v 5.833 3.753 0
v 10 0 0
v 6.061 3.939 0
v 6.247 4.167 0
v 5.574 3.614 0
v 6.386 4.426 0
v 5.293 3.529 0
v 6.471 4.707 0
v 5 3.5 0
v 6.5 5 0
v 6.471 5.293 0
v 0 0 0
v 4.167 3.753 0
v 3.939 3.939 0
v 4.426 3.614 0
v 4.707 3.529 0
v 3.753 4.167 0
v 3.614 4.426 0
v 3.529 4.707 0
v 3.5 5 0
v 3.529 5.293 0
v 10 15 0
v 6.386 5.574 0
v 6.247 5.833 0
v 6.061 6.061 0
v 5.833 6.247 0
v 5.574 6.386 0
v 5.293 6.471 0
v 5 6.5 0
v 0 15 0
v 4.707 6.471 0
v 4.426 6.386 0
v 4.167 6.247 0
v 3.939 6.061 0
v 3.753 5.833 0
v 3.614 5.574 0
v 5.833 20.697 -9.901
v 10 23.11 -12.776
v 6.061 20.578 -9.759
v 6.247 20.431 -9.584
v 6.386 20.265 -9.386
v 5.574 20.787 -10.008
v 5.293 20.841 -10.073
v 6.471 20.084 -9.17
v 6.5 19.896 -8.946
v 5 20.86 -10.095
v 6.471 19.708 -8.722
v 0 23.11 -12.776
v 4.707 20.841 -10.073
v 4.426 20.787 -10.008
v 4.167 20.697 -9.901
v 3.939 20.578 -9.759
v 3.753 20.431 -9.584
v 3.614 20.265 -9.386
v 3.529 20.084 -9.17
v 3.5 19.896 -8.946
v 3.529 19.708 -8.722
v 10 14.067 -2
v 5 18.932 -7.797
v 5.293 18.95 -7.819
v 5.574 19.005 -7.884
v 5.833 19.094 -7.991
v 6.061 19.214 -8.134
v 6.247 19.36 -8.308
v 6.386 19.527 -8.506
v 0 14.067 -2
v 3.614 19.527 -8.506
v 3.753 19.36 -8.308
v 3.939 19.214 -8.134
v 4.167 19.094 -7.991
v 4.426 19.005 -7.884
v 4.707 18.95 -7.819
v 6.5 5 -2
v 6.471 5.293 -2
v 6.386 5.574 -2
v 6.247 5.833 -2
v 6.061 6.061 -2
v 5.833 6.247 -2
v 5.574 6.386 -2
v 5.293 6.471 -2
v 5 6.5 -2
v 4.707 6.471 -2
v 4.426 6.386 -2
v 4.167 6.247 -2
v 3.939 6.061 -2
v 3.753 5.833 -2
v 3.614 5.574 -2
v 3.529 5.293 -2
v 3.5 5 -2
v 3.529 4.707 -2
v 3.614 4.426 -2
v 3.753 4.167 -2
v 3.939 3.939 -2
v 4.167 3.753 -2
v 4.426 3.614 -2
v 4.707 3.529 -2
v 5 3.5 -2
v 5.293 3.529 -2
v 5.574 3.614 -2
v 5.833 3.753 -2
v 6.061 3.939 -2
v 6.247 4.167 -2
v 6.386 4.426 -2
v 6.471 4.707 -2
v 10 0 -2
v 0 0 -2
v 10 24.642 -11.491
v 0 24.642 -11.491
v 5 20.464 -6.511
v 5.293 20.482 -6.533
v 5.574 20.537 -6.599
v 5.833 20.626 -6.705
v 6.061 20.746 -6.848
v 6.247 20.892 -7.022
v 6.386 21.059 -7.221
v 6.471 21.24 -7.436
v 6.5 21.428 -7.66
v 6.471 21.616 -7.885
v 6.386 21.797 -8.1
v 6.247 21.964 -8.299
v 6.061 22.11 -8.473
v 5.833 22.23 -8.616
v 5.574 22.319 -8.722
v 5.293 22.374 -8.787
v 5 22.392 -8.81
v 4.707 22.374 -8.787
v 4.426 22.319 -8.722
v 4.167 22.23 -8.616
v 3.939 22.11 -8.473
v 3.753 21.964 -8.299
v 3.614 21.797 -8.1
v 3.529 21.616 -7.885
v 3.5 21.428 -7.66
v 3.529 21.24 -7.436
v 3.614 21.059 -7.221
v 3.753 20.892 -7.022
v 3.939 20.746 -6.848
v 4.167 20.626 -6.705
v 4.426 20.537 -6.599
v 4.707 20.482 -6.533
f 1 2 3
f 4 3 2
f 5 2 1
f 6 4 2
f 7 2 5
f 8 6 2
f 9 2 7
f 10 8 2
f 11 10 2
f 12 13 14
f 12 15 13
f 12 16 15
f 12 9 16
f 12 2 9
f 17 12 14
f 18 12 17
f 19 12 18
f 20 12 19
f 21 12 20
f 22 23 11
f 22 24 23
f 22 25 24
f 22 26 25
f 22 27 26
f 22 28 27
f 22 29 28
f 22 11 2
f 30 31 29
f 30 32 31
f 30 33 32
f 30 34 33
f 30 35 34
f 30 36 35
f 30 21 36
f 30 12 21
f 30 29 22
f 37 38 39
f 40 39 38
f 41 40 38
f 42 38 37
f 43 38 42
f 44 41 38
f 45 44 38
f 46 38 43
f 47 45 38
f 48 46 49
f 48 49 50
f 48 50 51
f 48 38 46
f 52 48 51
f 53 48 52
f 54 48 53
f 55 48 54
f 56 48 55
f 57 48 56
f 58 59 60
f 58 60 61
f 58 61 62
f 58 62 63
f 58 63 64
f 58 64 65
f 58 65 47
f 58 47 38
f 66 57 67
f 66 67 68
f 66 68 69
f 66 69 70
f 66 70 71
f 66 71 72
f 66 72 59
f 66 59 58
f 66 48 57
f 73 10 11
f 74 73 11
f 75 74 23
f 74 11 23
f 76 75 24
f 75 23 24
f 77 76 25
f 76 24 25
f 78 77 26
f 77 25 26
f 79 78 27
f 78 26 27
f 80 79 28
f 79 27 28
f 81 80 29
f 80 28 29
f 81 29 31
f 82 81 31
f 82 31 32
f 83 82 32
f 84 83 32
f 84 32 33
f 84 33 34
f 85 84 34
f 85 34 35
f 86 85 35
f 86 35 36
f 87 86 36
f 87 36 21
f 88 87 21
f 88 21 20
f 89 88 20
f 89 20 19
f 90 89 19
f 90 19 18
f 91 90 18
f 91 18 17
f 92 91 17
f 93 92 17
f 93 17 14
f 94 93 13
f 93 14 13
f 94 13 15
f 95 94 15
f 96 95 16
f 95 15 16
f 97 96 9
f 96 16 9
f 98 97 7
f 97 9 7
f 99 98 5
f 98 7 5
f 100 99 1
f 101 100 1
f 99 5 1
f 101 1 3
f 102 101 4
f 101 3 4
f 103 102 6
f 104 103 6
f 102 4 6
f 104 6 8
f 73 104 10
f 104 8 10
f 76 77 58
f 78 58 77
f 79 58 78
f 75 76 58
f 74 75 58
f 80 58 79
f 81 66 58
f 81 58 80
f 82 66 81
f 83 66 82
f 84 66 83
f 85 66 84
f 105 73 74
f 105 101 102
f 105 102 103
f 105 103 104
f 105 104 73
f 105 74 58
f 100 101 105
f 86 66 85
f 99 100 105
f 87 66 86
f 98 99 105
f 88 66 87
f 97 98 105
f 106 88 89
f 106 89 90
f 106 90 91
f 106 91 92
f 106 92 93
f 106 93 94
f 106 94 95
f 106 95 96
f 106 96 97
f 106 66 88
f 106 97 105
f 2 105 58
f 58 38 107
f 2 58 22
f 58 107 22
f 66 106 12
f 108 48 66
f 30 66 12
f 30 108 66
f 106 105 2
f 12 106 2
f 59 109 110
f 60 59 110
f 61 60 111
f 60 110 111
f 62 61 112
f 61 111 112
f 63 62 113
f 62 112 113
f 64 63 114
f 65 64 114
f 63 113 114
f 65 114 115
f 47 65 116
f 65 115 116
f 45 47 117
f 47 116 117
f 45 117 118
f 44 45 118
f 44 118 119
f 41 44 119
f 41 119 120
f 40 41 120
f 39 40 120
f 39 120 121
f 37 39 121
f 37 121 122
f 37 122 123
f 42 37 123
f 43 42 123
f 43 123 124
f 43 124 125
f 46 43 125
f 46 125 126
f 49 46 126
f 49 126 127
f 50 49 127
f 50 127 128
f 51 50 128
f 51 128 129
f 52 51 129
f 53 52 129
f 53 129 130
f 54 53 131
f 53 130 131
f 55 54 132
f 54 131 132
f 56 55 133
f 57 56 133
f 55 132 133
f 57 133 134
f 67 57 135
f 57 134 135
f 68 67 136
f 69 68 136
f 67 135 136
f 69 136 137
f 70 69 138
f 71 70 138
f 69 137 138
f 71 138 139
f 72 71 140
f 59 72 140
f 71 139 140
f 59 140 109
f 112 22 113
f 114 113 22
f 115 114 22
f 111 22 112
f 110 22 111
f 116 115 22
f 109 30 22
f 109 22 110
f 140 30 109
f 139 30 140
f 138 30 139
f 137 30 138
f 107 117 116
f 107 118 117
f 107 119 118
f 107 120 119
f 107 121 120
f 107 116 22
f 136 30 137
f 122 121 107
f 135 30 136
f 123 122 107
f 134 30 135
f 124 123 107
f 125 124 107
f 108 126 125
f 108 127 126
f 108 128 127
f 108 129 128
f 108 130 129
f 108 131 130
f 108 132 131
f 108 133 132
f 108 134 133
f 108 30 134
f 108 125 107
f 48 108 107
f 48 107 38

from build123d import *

# Parameters (mm, degrees)
BOSS_EXTRUDE1_DEPTH = 10
SKETCH2_R           = 1.5
CUT_EXTRUDE1_DEPTH  = 10
SKETCH4_R           = 1.5
CUT_EXTRUDE2_DEPTH  = 10


with BuildPart() as part:
    # Sketch1 → Boss-Extrude1 (new body)
    with BuildSketch(Plane(origin=(0, 0, 0), x_dir=(0, 0, -1), z_dir=(1, 0, 0))):
        Polygon((0, 0), (0, 15), (11.490666647, 24.641814145), (12.776241866, 23.109725259), (2, 14.067384684), (2, 0), align=None)
    extrude(amount=BOSS_EXTRUDE1_DEPTH)

    # Sketch2 → Cut-Extrude1 (cut)
    with BuildSketch(Plane.XY):
        with Locations((5, 5)):
            Circle(SKETCH2_R)
    extrude(amount=-CUT_EXTRUDE1_DEPTH, mode=Mode.SUBTRACT)

    # Sketch4 → Cut-Extrude2 (cut)
    with BuildSketch(Plane(origin=(0, 8.802361333, 7.386058148), x_dir=(1, 0, 0), z_dir=(0, 0.7660444431189788, 0.6427876096865384))):
        with Locations(Location((5, 19.641814145, 0), (0, 0, 270))):
            Circle(SKETCH4_R)
    extrude(amount=-CUT_EXTRUDE2_DEPTH, mode=Mode.SUBTRACT)


solid = part.part
